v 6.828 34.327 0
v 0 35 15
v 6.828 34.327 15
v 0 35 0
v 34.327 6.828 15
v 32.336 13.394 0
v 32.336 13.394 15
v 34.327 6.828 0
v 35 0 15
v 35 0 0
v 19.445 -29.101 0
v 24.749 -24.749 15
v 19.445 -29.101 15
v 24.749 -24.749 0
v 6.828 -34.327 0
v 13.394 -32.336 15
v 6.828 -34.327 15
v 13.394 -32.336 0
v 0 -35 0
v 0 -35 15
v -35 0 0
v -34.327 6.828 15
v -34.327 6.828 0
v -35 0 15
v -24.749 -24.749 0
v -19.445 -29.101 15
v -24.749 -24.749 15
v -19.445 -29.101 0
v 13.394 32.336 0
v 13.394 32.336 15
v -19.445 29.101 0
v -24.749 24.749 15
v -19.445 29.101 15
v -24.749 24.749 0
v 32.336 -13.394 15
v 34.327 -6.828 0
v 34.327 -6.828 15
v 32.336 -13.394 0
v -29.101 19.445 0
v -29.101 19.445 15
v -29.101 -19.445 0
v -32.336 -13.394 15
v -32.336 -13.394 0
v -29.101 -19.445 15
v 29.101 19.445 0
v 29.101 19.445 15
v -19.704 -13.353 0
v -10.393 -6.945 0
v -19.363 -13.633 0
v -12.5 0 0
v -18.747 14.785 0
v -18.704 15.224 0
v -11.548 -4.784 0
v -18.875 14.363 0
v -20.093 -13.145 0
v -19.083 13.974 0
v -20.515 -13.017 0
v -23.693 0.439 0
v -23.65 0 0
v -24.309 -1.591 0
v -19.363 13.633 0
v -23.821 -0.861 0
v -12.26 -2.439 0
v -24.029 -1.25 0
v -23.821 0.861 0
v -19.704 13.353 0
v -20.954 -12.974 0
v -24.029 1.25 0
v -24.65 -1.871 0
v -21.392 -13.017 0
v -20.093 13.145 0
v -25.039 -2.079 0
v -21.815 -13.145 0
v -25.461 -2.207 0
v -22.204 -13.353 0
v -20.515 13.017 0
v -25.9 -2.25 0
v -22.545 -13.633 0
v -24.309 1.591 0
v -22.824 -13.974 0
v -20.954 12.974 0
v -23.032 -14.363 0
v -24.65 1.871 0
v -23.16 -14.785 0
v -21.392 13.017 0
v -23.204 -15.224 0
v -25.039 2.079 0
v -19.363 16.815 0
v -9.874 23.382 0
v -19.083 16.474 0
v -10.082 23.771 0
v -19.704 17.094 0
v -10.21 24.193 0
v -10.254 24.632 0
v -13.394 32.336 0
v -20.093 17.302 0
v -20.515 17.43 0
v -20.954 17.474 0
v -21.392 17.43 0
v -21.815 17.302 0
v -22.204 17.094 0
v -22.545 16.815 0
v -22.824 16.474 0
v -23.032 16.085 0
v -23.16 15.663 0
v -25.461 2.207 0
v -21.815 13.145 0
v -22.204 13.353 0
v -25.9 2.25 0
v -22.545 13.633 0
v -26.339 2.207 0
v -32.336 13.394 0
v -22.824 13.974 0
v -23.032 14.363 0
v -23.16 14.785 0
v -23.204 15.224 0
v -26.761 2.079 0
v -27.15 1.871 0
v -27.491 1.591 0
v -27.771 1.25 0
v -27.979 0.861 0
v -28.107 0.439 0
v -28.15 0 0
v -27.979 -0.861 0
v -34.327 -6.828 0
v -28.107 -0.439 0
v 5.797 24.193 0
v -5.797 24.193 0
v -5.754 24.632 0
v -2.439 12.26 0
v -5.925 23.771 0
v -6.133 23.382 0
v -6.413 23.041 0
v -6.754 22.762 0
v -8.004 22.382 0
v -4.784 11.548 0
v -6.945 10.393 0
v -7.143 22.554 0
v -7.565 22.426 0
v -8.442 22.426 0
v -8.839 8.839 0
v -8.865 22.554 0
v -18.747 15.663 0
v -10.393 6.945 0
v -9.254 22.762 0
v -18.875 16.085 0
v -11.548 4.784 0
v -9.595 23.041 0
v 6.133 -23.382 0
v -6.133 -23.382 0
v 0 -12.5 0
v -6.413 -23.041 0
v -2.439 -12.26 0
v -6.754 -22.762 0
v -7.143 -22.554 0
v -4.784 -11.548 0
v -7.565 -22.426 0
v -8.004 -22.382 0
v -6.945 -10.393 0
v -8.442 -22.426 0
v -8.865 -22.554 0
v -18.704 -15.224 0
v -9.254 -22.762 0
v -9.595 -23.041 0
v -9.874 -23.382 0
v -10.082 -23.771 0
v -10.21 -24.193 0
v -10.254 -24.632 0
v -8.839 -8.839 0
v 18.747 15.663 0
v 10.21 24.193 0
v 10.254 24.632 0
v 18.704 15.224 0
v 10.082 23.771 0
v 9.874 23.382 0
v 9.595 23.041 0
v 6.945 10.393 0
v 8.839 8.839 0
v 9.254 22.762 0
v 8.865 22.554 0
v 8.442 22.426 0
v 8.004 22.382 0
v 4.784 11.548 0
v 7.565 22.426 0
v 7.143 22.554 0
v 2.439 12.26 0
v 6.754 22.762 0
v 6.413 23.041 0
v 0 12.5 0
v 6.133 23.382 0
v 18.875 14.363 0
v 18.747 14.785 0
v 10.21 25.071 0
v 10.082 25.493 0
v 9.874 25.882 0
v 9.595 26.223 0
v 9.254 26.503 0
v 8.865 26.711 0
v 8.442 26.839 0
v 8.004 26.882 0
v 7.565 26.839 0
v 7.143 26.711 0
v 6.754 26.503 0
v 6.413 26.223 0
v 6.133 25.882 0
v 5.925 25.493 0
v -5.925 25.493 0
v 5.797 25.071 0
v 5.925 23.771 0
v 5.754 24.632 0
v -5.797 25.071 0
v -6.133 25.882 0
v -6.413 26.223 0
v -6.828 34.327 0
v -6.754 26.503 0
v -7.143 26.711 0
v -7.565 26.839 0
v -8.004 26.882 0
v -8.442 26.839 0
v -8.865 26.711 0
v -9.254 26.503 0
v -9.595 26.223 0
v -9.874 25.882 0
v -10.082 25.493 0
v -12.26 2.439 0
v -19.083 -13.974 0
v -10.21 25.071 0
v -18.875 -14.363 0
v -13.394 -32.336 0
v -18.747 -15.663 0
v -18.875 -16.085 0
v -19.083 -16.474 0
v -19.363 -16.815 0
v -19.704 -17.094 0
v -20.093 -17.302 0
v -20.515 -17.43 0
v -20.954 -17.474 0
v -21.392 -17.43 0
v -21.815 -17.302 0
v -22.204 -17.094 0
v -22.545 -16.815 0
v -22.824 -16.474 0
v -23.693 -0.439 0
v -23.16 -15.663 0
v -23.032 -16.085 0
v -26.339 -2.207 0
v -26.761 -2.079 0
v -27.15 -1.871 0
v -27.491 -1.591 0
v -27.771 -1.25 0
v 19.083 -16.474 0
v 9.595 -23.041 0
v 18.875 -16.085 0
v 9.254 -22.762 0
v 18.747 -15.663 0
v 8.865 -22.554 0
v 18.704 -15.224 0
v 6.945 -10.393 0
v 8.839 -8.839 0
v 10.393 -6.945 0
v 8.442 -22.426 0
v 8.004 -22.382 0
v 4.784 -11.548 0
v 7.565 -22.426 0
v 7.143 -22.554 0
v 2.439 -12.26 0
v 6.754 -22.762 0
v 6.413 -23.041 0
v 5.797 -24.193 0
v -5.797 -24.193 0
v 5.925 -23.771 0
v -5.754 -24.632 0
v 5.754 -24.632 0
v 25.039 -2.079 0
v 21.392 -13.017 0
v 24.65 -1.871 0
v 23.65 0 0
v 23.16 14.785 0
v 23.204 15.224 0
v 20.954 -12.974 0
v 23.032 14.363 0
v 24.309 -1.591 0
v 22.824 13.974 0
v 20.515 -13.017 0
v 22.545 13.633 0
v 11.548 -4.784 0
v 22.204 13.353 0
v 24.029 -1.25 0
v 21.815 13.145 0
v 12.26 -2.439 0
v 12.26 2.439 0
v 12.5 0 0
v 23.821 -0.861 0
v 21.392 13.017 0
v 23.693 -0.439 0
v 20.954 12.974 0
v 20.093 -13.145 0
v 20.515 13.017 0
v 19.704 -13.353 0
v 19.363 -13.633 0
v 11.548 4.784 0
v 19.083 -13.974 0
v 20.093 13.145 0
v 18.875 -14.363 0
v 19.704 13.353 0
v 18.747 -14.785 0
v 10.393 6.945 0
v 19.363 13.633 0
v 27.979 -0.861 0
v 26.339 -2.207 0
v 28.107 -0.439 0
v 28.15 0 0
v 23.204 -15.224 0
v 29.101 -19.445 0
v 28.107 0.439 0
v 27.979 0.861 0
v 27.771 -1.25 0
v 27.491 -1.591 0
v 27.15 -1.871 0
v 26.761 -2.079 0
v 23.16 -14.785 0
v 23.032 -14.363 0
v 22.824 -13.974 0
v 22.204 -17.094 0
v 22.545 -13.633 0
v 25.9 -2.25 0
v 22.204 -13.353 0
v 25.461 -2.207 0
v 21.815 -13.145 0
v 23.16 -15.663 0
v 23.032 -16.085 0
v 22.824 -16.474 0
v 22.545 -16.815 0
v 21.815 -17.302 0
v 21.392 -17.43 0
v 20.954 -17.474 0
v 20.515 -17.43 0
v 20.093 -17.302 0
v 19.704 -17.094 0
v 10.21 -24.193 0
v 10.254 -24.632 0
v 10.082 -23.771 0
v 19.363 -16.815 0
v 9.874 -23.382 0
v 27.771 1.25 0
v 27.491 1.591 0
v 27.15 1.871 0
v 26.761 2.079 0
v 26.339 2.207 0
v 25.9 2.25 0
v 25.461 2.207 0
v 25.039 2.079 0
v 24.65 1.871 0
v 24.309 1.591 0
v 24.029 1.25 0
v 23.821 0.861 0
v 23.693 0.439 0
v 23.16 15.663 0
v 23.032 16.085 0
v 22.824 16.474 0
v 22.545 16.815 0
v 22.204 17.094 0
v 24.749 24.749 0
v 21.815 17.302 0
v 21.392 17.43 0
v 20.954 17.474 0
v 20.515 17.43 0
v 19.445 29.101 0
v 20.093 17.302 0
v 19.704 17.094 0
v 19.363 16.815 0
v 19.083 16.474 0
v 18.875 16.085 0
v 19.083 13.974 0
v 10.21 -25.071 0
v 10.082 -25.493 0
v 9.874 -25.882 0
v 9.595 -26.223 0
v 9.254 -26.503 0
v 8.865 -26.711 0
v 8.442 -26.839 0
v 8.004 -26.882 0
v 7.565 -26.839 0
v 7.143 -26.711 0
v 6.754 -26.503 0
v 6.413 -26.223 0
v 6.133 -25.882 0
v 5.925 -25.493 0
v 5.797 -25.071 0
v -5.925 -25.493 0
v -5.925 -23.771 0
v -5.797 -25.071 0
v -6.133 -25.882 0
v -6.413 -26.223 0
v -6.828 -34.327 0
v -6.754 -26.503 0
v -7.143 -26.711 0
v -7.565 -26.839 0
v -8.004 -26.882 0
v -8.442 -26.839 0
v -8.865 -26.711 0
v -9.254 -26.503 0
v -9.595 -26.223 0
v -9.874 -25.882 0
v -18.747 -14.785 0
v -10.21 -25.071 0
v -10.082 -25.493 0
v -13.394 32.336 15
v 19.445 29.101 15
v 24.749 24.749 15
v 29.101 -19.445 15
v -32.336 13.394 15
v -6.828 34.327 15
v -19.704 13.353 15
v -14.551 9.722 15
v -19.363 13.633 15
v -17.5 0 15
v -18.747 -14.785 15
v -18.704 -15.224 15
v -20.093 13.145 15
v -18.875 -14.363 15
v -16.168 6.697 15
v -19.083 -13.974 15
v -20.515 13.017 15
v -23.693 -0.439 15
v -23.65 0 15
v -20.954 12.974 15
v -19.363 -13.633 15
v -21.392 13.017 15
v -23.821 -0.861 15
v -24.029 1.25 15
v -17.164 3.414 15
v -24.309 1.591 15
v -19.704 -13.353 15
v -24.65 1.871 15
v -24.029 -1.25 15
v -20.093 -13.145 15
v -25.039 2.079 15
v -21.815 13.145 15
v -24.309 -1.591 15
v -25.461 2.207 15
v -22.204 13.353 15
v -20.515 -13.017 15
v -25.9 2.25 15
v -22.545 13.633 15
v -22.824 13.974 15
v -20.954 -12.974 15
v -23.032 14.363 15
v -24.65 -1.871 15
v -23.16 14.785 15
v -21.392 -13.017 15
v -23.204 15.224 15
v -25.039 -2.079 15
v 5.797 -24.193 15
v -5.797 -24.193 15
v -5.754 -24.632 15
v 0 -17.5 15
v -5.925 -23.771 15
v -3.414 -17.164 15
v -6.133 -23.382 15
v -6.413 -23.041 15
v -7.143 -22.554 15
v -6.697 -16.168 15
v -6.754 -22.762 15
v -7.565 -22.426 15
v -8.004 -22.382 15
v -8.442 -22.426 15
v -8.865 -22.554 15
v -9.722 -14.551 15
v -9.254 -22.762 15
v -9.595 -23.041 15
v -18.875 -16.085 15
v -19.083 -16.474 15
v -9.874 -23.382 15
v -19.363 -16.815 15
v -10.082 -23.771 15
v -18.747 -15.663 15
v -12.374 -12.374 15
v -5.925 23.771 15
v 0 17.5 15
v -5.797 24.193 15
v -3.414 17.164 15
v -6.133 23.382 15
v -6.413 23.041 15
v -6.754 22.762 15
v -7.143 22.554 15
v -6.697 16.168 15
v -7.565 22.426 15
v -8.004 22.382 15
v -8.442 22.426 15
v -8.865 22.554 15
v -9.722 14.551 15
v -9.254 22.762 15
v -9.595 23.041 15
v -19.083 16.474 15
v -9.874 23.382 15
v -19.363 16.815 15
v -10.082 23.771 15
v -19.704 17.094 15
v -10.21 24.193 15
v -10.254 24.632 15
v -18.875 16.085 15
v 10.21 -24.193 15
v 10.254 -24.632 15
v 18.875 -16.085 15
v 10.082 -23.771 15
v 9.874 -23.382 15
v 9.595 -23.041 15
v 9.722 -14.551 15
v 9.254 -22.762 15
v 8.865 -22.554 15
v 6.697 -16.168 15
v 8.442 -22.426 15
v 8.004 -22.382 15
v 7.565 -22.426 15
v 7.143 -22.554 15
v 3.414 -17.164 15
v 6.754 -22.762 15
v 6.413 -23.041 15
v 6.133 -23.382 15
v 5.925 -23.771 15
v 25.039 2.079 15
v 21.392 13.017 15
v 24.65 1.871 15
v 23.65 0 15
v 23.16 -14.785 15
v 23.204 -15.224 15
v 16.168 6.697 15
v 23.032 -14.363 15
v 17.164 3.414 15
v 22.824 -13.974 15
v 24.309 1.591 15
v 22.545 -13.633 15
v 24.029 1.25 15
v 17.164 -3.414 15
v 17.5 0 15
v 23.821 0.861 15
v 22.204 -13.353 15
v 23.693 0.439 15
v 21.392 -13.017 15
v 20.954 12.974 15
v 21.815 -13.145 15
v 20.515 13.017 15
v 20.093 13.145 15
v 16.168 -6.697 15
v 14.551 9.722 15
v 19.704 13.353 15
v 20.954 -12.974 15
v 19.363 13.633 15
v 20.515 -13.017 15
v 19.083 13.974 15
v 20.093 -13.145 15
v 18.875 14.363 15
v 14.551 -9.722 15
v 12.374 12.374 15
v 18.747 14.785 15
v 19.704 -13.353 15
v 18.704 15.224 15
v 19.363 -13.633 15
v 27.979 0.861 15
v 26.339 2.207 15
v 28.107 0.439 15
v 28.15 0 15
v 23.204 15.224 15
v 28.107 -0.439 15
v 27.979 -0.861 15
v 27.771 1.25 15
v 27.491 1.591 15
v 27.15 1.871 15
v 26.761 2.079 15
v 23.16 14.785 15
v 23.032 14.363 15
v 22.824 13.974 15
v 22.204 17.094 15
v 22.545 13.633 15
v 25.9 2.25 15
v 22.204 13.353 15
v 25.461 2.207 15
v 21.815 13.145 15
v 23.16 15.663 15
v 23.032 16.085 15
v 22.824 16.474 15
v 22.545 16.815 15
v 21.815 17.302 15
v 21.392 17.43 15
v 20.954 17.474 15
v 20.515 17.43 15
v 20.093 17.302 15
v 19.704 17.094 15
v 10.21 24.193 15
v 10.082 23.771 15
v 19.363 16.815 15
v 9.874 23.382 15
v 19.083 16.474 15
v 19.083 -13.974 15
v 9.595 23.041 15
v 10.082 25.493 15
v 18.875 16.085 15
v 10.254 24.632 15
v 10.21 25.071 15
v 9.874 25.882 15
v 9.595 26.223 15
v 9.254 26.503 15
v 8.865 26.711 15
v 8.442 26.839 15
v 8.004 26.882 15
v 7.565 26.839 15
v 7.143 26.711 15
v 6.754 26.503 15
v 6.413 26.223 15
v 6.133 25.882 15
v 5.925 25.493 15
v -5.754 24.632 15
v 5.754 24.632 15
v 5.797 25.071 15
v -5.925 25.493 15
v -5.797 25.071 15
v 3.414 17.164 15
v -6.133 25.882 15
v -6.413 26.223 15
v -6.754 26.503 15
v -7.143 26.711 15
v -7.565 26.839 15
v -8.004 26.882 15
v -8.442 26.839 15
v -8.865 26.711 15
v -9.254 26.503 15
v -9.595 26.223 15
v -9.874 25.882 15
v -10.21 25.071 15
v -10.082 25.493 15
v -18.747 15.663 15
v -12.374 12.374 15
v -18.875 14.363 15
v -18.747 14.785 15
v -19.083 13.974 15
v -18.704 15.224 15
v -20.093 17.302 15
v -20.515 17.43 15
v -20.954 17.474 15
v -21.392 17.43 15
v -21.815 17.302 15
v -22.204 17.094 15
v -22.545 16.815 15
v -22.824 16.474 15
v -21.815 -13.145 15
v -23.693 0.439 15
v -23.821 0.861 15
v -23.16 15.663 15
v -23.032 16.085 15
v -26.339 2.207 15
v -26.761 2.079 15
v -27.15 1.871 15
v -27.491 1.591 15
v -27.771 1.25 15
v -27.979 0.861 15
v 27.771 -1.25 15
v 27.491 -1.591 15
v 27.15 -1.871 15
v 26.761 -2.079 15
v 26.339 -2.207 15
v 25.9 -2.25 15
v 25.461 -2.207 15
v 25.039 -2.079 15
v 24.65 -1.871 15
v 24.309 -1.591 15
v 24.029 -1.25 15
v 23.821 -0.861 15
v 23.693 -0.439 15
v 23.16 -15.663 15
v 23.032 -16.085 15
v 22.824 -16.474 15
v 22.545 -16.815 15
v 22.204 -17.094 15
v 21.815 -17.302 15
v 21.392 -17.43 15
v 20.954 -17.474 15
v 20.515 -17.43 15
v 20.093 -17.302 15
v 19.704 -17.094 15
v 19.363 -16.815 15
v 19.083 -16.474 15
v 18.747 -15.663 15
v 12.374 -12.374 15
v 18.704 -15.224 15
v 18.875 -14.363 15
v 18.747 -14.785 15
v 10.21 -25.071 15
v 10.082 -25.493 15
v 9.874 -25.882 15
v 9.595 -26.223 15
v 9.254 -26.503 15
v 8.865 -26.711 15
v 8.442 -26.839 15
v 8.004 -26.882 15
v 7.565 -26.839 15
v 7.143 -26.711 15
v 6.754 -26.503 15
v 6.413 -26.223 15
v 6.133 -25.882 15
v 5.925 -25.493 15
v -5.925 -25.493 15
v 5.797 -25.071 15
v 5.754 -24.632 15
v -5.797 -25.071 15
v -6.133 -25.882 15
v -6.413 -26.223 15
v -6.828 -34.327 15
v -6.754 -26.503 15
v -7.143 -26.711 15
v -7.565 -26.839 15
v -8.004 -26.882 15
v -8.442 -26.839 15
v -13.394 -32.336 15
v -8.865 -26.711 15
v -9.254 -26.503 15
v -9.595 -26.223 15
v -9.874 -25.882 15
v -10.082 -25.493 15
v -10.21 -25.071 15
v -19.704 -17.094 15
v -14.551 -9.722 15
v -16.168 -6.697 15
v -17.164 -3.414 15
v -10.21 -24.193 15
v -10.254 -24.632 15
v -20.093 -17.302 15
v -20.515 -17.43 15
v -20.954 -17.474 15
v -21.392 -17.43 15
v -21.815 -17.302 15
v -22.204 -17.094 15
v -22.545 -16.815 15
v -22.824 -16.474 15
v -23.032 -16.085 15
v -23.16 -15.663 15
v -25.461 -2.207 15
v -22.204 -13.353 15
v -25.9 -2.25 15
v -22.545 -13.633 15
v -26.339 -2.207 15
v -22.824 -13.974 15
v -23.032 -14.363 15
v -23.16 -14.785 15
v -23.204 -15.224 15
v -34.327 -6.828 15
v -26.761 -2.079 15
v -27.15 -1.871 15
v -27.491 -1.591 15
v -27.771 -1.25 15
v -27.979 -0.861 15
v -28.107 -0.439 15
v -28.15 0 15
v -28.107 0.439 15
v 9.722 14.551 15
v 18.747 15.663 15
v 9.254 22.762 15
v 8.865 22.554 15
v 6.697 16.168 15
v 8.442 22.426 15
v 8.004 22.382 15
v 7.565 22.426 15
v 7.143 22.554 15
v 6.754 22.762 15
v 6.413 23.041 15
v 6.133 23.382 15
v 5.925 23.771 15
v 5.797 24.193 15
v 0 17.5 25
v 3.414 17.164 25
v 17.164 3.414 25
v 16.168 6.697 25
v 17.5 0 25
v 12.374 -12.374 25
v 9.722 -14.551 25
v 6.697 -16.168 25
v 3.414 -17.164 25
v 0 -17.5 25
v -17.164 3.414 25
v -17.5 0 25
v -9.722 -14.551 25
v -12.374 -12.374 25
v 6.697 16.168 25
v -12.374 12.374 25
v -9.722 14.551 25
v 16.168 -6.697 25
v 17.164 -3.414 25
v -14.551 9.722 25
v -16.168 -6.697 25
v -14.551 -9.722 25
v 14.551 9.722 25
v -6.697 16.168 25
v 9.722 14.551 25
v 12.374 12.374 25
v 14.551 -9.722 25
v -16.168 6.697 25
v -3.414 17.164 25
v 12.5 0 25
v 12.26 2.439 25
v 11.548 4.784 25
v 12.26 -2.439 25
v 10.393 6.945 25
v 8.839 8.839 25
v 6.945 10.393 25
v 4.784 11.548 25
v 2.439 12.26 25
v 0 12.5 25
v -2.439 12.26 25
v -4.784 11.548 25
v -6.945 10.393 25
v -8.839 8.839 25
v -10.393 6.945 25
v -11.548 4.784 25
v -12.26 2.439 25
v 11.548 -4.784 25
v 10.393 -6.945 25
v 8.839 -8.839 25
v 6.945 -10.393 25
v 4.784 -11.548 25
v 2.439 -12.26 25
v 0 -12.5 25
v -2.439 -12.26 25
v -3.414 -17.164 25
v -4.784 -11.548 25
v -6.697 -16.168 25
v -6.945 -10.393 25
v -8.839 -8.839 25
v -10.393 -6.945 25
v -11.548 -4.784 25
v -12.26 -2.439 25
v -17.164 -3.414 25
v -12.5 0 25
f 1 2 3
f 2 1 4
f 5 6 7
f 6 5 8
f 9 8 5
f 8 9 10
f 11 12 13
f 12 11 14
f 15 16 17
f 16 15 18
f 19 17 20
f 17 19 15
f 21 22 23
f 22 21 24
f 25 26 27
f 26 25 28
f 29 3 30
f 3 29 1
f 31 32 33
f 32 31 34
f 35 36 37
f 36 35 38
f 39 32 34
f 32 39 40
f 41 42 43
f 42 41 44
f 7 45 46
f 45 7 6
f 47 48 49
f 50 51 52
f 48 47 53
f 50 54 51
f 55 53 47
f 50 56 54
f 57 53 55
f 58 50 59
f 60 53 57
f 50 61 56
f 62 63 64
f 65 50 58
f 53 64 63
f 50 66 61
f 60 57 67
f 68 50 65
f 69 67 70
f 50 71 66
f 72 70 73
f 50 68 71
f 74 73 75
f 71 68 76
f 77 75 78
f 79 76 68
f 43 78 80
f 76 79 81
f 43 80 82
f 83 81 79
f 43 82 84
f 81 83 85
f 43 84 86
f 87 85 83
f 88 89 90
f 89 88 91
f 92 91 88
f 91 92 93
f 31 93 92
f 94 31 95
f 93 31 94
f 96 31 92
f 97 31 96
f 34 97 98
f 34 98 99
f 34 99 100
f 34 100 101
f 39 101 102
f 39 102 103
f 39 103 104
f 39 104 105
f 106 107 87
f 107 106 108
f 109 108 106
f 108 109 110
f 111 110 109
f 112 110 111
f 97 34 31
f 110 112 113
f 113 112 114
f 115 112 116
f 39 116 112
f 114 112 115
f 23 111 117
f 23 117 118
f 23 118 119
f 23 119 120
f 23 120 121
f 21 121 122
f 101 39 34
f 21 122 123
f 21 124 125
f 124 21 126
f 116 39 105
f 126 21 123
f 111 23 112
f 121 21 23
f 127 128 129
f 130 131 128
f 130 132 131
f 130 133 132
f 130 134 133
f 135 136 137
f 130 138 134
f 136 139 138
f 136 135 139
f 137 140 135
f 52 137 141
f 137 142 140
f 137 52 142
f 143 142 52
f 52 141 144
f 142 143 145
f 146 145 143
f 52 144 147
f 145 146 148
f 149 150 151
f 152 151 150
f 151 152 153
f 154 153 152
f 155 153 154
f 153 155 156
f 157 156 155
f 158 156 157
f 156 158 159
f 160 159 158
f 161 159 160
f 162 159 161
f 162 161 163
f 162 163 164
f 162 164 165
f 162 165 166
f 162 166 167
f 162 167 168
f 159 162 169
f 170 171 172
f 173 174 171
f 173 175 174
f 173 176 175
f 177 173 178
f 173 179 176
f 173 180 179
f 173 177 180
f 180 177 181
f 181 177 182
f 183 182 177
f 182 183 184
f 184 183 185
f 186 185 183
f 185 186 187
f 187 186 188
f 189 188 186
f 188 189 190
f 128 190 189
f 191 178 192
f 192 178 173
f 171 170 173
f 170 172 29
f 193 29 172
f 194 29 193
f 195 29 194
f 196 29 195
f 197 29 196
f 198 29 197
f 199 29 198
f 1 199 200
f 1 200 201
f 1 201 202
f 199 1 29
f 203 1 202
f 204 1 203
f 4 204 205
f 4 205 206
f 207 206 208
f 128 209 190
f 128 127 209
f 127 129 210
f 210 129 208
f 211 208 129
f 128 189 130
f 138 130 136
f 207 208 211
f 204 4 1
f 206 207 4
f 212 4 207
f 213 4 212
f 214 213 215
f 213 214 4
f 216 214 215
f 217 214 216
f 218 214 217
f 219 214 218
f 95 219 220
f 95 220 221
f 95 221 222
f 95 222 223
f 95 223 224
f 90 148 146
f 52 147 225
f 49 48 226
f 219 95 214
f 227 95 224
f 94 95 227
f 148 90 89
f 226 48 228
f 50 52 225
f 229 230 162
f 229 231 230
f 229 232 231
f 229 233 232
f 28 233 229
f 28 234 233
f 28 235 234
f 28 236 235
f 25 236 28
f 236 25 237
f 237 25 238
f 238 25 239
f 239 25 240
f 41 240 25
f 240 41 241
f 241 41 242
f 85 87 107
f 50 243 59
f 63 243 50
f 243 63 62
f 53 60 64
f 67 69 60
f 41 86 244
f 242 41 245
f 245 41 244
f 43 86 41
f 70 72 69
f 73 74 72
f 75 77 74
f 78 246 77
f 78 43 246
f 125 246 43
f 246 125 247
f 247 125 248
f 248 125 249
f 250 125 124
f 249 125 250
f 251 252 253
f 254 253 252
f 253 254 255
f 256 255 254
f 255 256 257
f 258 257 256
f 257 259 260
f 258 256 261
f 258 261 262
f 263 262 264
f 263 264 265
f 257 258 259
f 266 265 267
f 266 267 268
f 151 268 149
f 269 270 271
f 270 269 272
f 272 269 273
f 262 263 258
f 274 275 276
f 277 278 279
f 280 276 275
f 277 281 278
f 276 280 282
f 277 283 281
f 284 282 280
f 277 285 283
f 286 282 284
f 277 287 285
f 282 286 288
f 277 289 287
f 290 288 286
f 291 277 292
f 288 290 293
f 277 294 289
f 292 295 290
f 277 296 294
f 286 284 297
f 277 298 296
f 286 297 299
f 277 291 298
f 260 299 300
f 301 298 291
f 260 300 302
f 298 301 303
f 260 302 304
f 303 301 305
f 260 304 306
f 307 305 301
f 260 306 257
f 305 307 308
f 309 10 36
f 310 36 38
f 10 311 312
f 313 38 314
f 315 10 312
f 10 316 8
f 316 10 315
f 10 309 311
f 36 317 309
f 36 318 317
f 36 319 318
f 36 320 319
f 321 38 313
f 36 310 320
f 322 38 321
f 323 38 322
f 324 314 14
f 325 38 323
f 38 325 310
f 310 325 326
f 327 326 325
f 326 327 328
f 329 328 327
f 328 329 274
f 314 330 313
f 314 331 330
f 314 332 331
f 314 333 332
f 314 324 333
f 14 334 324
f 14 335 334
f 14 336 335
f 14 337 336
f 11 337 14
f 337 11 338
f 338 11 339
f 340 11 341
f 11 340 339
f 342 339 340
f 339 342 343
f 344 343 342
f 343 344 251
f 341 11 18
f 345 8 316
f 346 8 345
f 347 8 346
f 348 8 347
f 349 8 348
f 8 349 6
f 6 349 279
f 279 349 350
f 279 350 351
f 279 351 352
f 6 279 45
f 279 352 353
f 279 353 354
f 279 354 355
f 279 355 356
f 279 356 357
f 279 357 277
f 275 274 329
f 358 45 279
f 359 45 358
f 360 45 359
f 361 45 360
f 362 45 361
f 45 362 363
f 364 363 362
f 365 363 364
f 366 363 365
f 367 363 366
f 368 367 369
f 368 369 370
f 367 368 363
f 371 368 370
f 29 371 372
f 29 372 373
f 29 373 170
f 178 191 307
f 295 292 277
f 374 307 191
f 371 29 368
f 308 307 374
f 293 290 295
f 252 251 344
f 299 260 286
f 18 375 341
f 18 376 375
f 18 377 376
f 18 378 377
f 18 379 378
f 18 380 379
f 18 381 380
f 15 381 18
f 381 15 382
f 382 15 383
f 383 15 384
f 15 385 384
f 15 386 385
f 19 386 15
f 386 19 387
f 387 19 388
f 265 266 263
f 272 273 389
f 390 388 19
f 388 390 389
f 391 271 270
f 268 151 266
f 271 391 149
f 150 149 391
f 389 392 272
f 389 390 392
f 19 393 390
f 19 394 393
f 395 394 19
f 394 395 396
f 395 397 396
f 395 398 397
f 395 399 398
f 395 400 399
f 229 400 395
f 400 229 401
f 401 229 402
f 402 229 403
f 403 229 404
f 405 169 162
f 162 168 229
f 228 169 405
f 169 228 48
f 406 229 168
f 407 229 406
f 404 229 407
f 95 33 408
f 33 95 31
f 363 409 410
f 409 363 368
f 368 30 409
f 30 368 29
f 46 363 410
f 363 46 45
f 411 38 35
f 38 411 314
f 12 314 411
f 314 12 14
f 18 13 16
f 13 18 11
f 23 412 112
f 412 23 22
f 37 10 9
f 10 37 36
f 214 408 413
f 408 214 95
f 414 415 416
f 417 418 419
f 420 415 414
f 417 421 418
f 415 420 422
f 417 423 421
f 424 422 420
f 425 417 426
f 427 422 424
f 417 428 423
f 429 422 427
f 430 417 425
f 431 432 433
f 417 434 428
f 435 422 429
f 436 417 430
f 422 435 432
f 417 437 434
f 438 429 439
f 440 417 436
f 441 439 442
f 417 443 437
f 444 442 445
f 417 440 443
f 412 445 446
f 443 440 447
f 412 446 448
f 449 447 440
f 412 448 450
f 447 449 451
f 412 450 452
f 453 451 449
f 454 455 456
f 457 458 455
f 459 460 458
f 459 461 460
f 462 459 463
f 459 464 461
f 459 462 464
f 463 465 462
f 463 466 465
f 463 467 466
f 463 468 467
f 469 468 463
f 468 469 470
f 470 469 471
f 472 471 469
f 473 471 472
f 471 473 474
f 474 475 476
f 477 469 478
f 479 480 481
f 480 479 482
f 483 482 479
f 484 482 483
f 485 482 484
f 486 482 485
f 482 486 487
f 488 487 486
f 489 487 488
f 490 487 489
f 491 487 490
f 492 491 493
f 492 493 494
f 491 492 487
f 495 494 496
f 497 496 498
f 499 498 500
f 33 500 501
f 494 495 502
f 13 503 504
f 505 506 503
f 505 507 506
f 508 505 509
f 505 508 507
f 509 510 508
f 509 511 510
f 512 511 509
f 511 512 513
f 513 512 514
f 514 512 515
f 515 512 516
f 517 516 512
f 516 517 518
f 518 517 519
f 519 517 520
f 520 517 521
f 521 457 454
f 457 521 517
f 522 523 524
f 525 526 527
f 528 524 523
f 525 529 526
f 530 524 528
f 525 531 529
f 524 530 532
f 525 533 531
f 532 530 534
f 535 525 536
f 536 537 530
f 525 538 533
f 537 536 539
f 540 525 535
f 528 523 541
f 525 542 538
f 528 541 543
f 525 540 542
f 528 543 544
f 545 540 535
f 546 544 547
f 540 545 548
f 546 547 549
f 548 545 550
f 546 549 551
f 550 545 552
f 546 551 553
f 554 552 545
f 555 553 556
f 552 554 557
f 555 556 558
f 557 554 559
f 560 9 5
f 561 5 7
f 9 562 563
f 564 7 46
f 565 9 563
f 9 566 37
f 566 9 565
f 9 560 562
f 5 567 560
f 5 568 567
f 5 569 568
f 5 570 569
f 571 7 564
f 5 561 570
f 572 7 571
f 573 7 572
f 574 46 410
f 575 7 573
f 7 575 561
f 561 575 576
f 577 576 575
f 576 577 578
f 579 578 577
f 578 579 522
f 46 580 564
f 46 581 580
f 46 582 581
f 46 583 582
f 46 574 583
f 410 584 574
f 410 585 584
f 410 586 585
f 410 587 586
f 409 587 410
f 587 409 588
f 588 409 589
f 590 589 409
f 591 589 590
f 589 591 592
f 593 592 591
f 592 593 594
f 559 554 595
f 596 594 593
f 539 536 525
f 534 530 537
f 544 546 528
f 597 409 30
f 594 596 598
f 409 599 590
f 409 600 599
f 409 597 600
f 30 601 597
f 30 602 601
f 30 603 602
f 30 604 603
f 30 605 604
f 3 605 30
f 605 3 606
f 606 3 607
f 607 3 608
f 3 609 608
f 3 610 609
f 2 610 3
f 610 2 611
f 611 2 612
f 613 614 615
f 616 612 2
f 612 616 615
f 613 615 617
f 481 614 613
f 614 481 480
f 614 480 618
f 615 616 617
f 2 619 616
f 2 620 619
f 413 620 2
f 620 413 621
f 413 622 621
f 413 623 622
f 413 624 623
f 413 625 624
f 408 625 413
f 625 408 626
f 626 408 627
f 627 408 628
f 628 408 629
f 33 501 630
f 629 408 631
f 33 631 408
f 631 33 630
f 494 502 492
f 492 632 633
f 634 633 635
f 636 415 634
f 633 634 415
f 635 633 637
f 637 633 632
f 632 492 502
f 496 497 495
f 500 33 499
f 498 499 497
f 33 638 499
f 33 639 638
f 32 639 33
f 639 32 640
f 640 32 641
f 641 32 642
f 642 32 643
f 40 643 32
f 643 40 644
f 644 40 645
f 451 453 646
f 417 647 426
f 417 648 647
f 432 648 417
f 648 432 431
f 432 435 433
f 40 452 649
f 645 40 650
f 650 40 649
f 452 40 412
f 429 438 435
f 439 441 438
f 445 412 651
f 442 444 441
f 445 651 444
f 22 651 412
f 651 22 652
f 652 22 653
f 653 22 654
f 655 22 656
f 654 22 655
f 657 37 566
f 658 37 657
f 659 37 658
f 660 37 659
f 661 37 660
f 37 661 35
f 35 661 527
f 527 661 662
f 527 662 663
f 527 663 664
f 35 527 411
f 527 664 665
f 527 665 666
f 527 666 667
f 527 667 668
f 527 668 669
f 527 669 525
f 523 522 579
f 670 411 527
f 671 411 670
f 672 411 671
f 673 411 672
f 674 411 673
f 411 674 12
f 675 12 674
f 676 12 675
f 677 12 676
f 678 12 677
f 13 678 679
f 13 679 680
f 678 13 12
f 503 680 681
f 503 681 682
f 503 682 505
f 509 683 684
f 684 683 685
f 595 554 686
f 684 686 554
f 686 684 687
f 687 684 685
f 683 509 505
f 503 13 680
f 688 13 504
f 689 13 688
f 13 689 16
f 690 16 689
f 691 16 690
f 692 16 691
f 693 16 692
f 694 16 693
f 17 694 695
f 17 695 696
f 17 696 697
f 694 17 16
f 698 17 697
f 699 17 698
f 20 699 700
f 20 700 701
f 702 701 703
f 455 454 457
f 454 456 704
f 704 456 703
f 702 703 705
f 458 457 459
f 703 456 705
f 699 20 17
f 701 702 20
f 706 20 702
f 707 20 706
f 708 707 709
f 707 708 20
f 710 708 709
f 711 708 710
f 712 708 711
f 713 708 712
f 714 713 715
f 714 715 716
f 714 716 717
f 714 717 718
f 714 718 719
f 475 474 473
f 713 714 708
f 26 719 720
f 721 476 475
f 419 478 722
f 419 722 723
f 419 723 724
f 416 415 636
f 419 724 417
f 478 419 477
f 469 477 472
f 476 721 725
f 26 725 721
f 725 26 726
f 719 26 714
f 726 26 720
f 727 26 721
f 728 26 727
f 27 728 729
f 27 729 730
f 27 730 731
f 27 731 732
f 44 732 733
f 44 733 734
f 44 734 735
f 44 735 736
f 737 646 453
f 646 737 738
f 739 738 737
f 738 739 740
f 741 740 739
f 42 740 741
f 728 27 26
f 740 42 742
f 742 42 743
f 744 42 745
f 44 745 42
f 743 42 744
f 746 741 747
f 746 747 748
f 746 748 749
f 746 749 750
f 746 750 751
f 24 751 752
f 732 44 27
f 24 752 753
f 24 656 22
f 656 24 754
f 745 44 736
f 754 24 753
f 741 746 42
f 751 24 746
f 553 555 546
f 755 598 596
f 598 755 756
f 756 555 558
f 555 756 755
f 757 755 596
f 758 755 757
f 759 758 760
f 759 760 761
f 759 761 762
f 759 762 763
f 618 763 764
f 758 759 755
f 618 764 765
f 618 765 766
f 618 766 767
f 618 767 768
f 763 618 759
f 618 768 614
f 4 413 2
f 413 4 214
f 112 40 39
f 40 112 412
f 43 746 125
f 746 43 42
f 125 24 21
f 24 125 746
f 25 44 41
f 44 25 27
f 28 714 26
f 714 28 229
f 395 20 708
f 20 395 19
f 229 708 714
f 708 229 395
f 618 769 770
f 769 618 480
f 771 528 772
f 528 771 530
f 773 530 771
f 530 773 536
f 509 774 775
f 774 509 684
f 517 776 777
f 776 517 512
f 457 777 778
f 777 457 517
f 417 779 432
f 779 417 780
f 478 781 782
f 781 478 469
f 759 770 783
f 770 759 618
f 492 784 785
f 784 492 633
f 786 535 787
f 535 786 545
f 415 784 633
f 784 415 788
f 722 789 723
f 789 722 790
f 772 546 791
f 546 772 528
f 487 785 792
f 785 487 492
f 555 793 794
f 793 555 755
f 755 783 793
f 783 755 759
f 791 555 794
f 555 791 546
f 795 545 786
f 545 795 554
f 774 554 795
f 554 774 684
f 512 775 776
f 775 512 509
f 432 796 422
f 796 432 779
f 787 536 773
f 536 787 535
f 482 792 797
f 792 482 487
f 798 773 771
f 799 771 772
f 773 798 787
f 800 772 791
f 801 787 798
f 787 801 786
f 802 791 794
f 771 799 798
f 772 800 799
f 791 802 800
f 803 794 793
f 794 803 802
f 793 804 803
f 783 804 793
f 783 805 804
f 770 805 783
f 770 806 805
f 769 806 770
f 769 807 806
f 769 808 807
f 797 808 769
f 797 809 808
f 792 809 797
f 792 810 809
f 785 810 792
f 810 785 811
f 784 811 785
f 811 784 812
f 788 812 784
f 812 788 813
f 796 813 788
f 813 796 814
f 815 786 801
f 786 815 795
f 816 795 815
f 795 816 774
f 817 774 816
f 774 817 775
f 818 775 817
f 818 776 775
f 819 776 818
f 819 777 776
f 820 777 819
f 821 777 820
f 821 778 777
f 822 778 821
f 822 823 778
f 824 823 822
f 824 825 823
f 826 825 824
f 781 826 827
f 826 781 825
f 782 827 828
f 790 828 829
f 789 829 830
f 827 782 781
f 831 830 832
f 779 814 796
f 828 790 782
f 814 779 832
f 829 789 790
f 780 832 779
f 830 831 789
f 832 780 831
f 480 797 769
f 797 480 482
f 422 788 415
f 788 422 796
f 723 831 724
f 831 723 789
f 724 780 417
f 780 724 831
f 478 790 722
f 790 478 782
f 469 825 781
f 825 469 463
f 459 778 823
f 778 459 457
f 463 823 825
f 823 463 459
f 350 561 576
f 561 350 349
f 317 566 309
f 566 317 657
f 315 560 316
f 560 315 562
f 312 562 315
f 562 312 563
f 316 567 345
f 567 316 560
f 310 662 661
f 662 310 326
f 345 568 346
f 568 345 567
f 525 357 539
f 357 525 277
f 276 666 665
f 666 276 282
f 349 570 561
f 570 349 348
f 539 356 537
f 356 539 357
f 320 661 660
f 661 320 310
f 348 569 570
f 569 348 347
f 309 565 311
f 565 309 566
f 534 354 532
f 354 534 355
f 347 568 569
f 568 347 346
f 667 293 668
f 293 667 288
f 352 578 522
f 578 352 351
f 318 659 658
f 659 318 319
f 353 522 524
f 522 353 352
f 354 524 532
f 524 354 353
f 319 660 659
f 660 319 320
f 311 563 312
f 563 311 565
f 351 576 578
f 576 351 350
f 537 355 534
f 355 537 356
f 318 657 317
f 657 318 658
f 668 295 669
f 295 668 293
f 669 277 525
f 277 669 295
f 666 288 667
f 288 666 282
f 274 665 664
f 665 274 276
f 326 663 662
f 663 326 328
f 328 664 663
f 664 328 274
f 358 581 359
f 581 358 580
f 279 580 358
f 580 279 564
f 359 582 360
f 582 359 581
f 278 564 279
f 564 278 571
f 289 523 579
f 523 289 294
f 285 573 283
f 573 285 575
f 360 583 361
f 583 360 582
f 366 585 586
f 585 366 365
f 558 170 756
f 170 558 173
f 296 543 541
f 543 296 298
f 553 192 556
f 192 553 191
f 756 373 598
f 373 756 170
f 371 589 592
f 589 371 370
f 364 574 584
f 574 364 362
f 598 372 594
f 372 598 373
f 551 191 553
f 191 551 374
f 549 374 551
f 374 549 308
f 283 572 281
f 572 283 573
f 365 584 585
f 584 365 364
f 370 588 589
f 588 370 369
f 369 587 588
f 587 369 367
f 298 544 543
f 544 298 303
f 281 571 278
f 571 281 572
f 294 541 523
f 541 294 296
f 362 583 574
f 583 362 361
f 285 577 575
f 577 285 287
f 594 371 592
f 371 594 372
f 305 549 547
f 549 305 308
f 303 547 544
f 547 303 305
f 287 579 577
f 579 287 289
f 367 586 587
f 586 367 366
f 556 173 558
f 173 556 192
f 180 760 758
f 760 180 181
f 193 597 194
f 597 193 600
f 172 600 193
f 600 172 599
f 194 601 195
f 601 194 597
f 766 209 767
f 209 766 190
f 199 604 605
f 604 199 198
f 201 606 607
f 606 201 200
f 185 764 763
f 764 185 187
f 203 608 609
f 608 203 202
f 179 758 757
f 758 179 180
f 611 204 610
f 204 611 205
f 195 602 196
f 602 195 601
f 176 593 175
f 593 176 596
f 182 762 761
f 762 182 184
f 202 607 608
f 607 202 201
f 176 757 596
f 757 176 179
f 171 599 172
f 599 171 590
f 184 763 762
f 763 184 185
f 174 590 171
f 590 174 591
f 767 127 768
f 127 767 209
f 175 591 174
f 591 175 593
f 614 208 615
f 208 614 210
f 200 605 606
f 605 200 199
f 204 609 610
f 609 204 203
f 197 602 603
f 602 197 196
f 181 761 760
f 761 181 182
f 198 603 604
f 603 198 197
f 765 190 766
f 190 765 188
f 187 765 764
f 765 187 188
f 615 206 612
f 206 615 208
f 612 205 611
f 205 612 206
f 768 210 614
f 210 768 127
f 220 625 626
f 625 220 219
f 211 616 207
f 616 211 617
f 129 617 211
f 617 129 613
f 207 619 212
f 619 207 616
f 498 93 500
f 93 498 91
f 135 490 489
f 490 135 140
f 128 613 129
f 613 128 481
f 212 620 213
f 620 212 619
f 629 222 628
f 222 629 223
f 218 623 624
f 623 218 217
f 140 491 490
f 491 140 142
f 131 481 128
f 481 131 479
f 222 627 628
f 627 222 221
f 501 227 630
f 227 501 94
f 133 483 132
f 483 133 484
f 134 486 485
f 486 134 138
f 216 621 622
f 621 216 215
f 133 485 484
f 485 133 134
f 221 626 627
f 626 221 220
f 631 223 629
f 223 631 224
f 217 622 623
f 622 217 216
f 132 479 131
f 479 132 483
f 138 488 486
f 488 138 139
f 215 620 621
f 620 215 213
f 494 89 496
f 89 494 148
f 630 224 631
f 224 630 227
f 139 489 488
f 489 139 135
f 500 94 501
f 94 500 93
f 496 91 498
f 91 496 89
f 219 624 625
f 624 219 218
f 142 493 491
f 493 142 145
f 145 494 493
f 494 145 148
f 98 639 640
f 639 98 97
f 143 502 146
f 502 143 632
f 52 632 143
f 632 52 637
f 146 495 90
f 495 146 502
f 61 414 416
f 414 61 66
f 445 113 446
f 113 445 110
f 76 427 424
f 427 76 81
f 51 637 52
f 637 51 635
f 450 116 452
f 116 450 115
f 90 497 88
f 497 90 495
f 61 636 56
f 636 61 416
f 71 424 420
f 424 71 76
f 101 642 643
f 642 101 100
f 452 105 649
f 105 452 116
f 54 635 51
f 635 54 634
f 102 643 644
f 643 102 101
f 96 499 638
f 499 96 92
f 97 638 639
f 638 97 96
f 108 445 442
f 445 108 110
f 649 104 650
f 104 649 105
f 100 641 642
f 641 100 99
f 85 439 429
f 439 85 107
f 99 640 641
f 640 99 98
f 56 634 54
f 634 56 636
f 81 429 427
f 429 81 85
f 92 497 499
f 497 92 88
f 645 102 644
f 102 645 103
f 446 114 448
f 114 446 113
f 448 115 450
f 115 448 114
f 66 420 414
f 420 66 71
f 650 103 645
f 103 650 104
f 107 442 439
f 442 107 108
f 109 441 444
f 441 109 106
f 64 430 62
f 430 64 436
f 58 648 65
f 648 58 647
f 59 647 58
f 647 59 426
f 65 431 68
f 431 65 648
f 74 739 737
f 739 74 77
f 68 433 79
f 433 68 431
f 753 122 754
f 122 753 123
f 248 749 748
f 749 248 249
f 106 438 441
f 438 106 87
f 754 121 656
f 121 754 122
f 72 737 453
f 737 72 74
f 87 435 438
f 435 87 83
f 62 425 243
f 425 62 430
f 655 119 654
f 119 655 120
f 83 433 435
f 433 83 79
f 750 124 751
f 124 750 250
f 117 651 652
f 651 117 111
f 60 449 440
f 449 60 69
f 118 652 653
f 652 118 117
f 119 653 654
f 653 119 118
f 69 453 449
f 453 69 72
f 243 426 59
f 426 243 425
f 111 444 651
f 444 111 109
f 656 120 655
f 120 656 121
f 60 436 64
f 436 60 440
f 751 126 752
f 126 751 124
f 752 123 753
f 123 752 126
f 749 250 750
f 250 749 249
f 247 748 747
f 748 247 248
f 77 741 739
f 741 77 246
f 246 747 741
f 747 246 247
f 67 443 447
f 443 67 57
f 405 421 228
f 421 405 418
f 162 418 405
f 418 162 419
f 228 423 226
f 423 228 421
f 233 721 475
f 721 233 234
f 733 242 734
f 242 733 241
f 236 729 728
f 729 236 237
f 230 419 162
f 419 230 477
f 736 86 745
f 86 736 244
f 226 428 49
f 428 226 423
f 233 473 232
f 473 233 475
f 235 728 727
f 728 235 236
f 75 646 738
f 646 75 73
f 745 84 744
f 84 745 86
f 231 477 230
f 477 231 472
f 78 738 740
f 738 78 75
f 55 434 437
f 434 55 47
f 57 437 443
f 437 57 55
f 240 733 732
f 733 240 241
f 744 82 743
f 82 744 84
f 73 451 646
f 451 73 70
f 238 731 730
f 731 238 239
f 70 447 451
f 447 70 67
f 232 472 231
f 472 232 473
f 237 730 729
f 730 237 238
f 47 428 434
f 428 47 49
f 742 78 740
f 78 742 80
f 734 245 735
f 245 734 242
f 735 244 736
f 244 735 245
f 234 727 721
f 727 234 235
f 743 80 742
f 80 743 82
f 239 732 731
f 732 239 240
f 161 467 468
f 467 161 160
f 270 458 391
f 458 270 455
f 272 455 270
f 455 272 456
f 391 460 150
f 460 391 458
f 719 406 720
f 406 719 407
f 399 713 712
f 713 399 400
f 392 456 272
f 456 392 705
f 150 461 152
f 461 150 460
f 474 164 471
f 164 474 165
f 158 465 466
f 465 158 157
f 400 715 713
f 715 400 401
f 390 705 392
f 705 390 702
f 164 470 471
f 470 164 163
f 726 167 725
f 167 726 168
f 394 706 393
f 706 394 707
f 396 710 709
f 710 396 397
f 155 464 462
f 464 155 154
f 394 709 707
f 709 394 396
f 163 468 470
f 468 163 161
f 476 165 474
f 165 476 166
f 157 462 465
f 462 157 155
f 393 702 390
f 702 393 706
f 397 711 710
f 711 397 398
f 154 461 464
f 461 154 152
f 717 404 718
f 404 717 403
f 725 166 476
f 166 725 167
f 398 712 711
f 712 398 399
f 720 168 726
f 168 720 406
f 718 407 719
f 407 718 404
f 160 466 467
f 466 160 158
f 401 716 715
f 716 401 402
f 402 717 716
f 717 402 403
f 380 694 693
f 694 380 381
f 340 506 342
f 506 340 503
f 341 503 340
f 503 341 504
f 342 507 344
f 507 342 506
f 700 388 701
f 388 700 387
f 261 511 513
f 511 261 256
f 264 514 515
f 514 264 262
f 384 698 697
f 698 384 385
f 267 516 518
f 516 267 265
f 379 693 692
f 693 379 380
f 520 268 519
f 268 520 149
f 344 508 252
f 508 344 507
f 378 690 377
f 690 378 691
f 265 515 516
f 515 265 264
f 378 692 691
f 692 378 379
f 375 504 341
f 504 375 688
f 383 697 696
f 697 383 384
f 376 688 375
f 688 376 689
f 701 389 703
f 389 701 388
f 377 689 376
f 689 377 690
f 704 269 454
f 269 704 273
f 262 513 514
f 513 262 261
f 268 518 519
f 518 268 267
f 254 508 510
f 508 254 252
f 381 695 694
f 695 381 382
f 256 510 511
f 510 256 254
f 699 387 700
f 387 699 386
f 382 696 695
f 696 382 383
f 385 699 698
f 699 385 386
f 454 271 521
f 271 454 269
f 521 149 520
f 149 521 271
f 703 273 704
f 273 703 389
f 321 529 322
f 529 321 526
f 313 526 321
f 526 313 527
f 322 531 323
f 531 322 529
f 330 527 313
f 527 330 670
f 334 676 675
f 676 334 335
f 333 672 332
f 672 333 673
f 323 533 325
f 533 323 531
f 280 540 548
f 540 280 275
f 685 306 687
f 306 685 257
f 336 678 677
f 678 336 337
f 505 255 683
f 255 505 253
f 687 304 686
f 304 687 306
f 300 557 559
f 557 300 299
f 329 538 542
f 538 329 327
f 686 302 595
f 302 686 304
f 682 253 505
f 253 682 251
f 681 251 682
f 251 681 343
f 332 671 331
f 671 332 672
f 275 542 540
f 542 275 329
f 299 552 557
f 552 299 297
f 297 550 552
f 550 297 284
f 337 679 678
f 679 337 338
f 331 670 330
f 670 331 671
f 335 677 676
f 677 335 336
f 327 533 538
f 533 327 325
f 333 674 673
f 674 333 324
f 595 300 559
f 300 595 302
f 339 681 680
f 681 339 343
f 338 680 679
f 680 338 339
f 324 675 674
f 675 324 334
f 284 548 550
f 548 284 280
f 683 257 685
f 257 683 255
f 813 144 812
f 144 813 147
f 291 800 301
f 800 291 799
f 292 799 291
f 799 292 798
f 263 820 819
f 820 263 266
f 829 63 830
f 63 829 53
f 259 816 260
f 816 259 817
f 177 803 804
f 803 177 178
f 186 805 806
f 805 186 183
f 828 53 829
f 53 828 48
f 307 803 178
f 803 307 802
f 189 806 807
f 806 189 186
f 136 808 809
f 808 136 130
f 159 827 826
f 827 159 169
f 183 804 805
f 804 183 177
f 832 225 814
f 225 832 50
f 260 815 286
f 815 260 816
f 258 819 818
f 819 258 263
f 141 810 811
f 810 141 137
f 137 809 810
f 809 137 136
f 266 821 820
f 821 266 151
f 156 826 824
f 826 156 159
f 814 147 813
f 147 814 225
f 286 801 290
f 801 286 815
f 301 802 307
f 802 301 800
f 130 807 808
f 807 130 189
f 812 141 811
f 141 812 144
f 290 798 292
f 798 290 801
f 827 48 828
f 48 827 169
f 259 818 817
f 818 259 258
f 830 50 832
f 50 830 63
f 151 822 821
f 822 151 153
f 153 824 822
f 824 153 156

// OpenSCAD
$fn = 32;

// ----------------------------------------------------------------------
// Flange Ø70 x 15
// 10 holes on a Ø51.8 bolt circle, bolted joints
// ----------------------------------------------------------------------

// --- parameters (mm) ---
flange_d = 70;   // outside diameter of the flange
thickness = 15;  // flange thickness
holes = 10;      // number of bolt holes
pcd = 51.8;      // bolt circle diameter
start_deg = 0;   // angle of the first hole, from +X
hole_d = 4.5;    // bolt hole diameter
bore_d = 25;     // central through bore
hub_d = 35;      // hub outside diameter
hub_h = 10;      // hub height above the flange face (0 = no hub)

// --- derived feature positions (mm) ---
height = thickness + hub_h;  // = 25   overall height of the part
pcd_r = pcd / 2;             // = 25.9   bolt circle radius
hole_step = 360 / holes;     // = 36   angular pitch
feature_centers = [
  [pcd_r * cos(start_deg + 0 * hole_step), pcd_r * sin(start_deg + 0 * hole_step)],
  [pcd_r * cos(start_deg + 1 * hole_step), pcd_r * sin(start_deg + 1 * hole_step)],
  [pcd_r * cos(start_deg + 2 * hole_step), pcd_r * sin(start_deg + 2 * hole_step)],
  [pcd_r * cos(start_deg + 3 * hole_step), pcd_r * sin(start_deg + 3 * hole_step)],
  [pcd_r * cos(start_deg + 4 * hole_step), pcd_r * sin(start_deg + 4 * hole_step)],
  [pcd_r * cos(start_deg + 5 * hole_step), pcd_r * sin(start_deg + 5 * hole_step)],
  [pcd_r * cos(start_deg + 6 * hole_step), pcd_r * sin(start_deg + 6 * hole_step)],
  [pcd_r * cos(start_deg + 7 * hole_step), pcd_r * sin(start_deg + 7 * hole_step)],
  [pcd_r * cos(start_deg + 8 * hole_step), pcd_r * sin(start_deg + 8 * hole_step)],
  [pcd_r * cos(start_deg + 9 * hole_step), pcd_r * sin(start_deg + 9 * hole_step)]
];   // bolt hole centres on the pitch circle

// flange disc, every hole and the bore cut straight through
difference() {
  union() {
    cylinder(d = flange_d, h = thickness);
    cylinder(d = hub_d, h = height);  // hub, overlapped into the flange
  }
  translate([0, 0, -1]) cylinder(d = bore_d, h = height + 2);  // bore, through
  for (centre = feature_centers)
    translate([centre[0], centre[1], -1]) cylinder(d = hole_d, h = thickness + 2);
}
